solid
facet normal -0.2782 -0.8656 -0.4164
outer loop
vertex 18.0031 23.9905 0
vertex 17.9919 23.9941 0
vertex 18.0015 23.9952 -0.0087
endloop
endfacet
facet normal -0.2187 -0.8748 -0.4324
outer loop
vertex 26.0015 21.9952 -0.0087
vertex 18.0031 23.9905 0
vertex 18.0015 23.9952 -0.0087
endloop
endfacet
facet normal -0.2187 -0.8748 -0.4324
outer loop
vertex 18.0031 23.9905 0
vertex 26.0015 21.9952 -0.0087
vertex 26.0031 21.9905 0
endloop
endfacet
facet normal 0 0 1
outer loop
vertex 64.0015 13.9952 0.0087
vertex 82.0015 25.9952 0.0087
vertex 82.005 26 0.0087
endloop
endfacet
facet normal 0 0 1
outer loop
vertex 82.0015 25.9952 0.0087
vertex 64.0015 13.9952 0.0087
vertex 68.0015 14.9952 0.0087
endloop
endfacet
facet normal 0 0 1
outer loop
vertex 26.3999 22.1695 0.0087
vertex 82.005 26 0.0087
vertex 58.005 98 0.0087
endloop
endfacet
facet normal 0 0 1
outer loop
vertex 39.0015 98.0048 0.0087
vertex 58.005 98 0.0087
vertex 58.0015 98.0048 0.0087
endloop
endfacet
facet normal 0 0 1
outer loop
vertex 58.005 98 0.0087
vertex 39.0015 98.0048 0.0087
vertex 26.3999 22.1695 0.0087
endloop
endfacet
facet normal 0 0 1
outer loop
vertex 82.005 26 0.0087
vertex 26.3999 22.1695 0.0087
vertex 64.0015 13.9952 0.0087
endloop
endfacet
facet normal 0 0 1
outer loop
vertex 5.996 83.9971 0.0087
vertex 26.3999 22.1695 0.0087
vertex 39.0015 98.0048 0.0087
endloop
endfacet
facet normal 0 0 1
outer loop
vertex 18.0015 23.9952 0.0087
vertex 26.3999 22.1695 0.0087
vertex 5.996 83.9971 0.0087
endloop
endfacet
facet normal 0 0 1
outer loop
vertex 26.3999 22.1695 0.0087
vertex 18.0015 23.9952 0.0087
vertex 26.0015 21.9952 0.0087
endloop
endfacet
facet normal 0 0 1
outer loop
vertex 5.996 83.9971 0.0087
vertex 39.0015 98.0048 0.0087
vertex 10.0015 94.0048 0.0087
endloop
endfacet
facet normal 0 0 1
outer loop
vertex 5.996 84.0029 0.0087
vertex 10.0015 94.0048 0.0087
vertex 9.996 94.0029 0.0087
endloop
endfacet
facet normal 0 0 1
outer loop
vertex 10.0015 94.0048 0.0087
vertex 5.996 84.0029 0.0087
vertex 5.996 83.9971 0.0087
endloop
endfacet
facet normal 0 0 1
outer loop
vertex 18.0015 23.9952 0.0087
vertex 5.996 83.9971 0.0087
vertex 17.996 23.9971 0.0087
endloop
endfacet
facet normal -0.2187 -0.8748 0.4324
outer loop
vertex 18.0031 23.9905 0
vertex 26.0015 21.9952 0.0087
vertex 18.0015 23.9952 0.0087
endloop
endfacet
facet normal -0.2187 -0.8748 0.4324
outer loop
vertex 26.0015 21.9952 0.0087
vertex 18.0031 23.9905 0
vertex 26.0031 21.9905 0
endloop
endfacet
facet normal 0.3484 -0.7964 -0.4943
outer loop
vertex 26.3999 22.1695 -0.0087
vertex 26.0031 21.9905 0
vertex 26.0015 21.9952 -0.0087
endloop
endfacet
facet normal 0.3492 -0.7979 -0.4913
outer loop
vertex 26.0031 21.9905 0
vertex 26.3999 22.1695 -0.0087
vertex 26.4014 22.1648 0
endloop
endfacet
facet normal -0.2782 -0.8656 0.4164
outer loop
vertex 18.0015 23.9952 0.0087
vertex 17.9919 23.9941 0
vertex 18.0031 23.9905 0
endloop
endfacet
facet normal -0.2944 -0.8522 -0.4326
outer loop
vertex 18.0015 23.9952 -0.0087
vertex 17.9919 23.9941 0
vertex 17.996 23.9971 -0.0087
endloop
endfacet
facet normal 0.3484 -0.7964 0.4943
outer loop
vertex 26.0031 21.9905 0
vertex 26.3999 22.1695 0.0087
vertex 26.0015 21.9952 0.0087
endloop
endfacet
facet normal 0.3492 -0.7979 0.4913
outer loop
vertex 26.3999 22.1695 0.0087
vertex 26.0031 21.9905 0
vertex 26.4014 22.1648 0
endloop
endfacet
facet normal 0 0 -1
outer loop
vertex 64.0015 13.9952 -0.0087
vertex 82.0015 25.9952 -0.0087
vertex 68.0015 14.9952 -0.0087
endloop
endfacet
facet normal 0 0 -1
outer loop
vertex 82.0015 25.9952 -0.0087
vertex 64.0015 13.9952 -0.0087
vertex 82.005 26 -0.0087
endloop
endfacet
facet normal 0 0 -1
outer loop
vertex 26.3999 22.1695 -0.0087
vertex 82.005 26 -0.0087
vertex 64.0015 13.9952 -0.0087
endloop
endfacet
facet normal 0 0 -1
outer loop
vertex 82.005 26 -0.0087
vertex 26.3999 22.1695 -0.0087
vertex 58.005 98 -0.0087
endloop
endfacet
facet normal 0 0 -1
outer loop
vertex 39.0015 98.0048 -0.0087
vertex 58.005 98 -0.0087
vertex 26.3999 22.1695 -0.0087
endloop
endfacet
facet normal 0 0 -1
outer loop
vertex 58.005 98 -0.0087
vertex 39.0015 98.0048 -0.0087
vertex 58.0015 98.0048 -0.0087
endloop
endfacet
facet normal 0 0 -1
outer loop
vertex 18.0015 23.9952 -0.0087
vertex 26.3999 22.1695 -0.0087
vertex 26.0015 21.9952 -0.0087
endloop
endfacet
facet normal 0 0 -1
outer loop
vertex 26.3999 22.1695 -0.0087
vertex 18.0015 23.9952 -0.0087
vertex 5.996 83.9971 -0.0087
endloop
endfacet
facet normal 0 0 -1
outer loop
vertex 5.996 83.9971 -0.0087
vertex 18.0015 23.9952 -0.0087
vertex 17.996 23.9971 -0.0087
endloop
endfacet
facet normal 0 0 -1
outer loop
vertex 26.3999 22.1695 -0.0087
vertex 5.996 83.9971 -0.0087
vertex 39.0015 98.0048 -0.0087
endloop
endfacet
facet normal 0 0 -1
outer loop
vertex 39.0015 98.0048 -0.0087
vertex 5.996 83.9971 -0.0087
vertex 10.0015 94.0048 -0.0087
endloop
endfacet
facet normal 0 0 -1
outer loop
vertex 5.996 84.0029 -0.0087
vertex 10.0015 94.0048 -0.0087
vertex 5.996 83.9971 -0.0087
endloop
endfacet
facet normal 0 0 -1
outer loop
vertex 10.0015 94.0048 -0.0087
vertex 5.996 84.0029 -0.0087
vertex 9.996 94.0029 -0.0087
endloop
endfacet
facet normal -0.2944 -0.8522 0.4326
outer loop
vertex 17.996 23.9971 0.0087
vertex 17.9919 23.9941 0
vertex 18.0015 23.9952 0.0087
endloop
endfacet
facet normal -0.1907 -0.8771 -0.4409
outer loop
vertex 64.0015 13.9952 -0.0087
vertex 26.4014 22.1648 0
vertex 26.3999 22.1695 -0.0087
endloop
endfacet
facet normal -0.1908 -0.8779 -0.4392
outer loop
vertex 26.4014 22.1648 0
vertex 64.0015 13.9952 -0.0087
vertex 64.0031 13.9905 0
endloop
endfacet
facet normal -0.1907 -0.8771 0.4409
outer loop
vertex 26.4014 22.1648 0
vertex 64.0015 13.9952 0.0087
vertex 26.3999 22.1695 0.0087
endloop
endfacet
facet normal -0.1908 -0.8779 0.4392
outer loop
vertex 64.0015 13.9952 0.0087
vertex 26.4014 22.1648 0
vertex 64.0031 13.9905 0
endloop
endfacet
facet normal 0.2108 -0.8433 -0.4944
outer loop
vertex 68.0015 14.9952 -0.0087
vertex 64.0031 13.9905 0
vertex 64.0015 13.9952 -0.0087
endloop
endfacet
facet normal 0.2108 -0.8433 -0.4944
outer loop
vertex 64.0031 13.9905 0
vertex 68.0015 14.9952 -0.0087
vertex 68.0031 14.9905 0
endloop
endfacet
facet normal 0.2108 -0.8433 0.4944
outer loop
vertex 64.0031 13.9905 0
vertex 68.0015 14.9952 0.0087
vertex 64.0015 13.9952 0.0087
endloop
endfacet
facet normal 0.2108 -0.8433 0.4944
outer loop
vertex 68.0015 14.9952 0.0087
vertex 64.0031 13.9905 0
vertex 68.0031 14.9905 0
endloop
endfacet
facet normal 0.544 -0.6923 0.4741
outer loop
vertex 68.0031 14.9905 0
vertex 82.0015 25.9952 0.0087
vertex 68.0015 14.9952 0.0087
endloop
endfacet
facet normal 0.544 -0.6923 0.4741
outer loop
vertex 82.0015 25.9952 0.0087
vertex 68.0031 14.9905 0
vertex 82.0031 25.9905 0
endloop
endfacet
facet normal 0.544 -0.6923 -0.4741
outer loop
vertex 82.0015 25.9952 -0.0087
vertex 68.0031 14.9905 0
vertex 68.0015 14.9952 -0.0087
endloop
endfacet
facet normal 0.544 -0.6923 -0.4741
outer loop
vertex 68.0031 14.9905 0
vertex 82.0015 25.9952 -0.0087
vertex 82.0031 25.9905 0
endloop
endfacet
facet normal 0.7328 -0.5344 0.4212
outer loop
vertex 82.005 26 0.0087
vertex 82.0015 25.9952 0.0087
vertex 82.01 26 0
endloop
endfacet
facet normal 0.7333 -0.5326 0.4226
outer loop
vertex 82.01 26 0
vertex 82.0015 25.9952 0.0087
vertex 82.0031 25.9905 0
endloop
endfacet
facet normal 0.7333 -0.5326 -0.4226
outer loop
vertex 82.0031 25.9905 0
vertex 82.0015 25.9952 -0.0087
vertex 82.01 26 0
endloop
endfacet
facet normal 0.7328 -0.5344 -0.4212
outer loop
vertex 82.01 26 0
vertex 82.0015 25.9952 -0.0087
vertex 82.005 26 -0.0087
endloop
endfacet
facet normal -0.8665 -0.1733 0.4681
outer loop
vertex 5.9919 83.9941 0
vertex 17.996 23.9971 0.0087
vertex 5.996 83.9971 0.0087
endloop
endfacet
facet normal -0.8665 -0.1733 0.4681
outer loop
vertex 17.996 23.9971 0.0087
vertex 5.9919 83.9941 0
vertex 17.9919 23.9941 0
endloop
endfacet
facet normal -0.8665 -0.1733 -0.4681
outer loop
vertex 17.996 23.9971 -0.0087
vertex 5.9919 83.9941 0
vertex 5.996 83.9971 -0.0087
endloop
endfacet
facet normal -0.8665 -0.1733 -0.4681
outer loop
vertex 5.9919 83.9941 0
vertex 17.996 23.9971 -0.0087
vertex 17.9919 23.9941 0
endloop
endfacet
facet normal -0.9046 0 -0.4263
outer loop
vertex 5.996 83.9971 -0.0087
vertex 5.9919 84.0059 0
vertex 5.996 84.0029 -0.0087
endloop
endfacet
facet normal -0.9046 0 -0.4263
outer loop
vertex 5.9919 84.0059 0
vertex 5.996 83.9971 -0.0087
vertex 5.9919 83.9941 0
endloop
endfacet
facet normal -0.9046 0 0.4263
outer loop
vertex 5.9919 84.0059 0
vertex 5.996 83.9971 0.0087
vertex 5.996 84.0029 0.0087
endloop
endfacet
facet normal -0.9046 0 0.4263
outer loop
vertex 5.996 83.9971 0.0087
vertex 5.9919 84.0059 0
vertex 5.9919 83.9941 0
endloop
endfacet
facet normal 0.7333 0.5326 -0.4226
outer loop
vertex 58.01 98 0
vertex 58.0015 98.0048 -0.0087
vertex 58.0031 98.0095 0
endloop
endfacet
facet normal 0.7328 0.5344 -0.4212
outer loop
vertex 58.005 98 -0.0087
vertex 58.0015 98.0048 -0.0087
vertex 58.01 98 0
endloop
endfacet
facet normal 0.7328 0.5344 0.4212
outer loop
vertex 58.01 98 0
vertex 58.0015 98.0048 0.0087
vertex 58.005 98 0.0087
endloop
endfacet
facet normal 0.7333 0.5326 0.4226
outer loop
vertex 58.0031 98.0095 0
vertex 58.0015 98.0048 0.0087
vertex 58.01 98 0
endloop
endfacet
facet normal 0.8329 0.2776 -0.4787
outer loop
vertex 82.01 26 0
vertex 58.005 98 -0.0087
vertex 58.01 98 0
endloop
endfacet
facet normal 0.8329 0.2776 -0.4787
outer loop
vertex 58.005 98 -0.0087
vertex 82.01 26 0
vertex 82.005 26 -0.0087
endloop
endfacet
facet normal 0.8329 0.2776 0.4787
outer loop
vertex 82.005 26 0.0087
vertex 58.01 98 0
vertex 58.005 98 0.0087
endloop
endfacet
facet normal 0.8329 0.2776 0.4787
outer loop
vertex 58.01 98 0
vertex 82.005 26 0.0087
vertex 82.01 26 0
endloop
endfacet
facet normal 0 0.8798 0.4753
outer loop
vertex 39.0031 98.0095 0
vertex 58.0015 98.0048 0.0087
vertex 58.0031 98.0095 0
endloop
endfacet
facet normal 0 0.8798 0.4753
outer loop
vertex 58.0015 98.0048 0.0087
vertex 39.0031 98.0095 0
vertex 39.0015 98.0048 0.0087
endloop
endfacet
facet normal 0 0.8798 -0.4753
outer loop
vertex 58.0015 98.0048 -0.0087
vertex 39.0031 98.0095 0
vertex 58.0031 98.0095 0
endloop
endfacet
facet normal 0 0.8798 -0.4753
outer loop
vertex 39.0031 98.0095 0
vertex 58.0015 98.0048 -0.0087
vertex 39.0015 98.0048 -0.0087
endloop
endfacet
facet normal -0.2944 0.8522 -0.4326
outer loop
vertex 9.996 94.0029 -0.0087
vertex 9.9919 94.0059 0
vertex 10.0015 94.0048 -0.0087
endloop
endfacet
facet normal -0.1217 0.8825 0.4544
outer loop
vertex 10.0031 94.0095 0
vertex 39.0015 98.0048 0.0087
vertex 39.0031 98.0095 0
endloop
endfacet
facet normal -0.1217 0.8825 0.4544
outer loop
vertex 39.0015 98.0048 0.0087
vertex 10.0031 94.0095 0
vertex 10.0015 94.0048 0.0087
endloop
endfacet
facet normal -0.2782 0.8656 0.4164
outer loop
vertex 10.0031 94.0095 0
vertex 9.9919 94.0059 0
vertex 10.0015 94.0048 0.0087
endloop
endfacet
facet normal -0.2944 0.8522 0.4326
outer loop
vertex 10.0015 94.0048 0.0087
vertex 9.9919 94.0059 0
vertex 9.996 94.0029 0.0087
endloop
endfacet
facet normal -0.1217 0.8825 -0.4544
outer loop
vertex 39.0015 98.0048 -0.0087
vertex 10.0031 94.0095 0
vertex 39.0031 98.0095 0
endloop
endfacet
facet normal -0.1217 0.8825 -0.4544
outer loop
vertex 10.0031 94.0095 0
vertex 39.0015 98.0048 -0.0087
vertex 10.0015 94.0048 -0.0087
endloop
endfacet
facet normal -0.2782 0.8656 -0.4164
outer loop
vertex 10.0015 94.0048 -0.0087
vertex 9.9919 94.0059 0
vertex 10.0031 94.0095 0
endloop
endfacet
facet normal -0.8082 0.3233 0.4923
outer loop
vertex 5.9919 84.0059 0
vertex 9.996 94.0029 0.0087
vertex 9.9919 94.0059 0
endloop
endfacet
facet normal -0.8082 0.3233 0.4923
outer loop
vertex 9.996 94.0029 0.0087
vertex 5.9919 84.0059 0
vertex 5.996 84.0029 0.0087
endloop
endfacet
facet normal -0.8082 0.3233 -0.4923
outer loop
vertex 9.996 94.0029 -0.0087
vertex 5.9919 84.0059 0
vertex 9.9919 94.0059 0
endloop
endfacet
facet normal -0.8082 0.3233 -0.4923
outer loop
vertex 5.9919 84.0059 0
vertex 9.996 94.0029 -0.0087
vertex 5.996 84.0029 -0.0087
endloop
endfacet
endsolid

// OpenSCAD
color([0.3519350680925015,0.6477014615427978,0.14125726454845833]) hull(){
    translate([18,24]) sphere(0.01);
    translate([26,22]) sphere(0.01);
    translate([42,29]) sphere(0.01);
}
color([0.23013900541024712,0.8285218163248013,0.9603761550286747]) hull(){
    translate([18,24]) sphere(0.01);
    translate([42,29]) sphere(0.01);
    translate([64,14]) sphere(0.01);
}
color([0.6050710034948523,0.017553655236826726,0.43262871278032167]) hull(){
    translate([42,29]) sphere(0.01);
    translate([68,15]) sphere(0.01);
    translate([64,14]) sphere(0.01);
}
color([0.2571490251669072,0.4480229944680496,0.14517873337393172]) hull(){
    translate([68,15]) sphere(0.01);
    translate([64,14]) sphere(0.01);
    translate([82,26]) sphere(0.01);
}
color([0.8405131005933094,0.9776834869331054,0.10300019528175153]) hull(){
    translate([42,29]) sphere(0.01);
    translate([68,15]) sphere(0.01);
    translate([58,33]) sphere(0.01);
}
color([0.998153073210626,0.8535026464000083,0.6855970549077809]) hull(){
    translate([68,15]) sphere(0.01);
    translate([58,33]) sphere(0.01);
    translate([82,26]) sphere(0.01);
}
color([0.7995005100691247,0.34047238184459006,0.1286635278612125]) hull(){
    translate([42,29]) sphere(0.01);
    translate([58,33]) sphere(0.01);
    translate([44,47]) sphere(0.01);
}
color([0.6020598448119898,0.9167847797194366,0.02081986636819022]) hull(){
    translate([42,29]) sphere(0.01);
    translate([44,47]) sphere(0.01);
    translate([44,55]) sphere(0.01);
}
color([0.9135118305629362,0.3823609034395232,0.42581309278619206]) hull(){
    translate([42,29]) sphere(0.01);
    translate([44,55]) sphere(0.01);
    translate([26,22]) sphere(0.01);
}
color([0.08967296065919184,0.0016857337534631478,0.31287848776698257]) hull(){
    translate([26,22]) sphere(0.01);
    translate([44,55]) sphere(0.01);
    translate([18,58]) sphere(0.01);
}
color([0.09731792302828757,0.364404074066101,0.8754307508322564]) hull(){
    translate([26,22]) sphere(0.01);
    translate([18,58]) sphere(0.01);
    translate([18,24]) sphere(0.01);
}
color([0.6967090939923642,0.5776053806129825,0.18685318159950626]) hull(){
    translate([18,58]) sphere(0.01);
    translate([18,24]) sphere(0.01);
    translate([6,84]) sphere(0.01);
}
color([0.9585806736472646,0.593334846568766,0.09927504601217696]) hull(){
    translate([18,58]) sphere(0.01);
    translate([6,84]) sphere(0.01);
    translate([22,90]) sphere(0.01);
}
color([0.19313665173925,0.6863688301261038,0.2093263356404984]) hull(){
    translate([18,58]) sphere(0.01);
    translate([22,90]) sphere(0.01);
    translate([44,55]) sphere(0.01);
}
color([0.2694340379225941,0.24598969558588324,0.16092298384524362]) hull(){
    translate([22,90]) sphere(0.01);
    translate([44,55]) sphere(0.01);
    translate([50,93]) sphere(0.01);
}
color([0.5102606956149307,0.431705445139412,0.38909399282504675]) hull(){
    translate([44,55]) sphere(0.01);
    translate([50,93]) sphere(0.01);
    translate([44,47]) sphere(0.01);
}
color([0.3194819673674283,0.6655357355223767,0.22692357675811492]) hull(){
    translate([44,47]) sphere(0.01);
    translate([50,93]) sphere(0.01);
    translate([58,33]) sphere(0.01);
}
color([0.9464906820257937,0.35776616524050997,0.9421064453260054]) hull(){
    translate([58,98]) sphere(0.01);
    translate([50,93]) sphere(0.01);
    translate([58,33]) sphere(0.01);
}
color([0.3792404853118415,0.27508202782836655,0.9368074710650367]) hull(){
    translate([58,98]) sphere(0.01);
    translate([58,33]) sphere(0.01);
    translate([82,26]) sphere(0.01);
}
color([0.7670397757471089,0.17483880300164423,0.7474114244696689]) hull(){
    translate([50,93]) sphere(0.01);
    translate([22,90]) sphere(0.01);
    translate([39,98]) sphere(0.01);
}
color([0.6015236368594579,0.5872808850844162,0.28390336255679416]) hull(){
    translate([50,93]) sphere(0.01);
    translate([39,98]) sphere(0.01);
    translate([58,98]) sphere(0.01);
}
color([0.5839405385485582,0.4048698908705002,0.6877557316706271]) hull(){
    translate([22,90]) sphere(0.01);
    translate([39,98]) sphere(0.01);
    translate([10,94]) sphere(0.01);
}
color([0.29310936231965135,0.08456113000314536,0.6409271470126323]) hull(){
    translate([22,90]) sphere(0.01);
    translate([10,94]) sphere(0.01);
    translate([6,84]) sphere(0.01);
}
